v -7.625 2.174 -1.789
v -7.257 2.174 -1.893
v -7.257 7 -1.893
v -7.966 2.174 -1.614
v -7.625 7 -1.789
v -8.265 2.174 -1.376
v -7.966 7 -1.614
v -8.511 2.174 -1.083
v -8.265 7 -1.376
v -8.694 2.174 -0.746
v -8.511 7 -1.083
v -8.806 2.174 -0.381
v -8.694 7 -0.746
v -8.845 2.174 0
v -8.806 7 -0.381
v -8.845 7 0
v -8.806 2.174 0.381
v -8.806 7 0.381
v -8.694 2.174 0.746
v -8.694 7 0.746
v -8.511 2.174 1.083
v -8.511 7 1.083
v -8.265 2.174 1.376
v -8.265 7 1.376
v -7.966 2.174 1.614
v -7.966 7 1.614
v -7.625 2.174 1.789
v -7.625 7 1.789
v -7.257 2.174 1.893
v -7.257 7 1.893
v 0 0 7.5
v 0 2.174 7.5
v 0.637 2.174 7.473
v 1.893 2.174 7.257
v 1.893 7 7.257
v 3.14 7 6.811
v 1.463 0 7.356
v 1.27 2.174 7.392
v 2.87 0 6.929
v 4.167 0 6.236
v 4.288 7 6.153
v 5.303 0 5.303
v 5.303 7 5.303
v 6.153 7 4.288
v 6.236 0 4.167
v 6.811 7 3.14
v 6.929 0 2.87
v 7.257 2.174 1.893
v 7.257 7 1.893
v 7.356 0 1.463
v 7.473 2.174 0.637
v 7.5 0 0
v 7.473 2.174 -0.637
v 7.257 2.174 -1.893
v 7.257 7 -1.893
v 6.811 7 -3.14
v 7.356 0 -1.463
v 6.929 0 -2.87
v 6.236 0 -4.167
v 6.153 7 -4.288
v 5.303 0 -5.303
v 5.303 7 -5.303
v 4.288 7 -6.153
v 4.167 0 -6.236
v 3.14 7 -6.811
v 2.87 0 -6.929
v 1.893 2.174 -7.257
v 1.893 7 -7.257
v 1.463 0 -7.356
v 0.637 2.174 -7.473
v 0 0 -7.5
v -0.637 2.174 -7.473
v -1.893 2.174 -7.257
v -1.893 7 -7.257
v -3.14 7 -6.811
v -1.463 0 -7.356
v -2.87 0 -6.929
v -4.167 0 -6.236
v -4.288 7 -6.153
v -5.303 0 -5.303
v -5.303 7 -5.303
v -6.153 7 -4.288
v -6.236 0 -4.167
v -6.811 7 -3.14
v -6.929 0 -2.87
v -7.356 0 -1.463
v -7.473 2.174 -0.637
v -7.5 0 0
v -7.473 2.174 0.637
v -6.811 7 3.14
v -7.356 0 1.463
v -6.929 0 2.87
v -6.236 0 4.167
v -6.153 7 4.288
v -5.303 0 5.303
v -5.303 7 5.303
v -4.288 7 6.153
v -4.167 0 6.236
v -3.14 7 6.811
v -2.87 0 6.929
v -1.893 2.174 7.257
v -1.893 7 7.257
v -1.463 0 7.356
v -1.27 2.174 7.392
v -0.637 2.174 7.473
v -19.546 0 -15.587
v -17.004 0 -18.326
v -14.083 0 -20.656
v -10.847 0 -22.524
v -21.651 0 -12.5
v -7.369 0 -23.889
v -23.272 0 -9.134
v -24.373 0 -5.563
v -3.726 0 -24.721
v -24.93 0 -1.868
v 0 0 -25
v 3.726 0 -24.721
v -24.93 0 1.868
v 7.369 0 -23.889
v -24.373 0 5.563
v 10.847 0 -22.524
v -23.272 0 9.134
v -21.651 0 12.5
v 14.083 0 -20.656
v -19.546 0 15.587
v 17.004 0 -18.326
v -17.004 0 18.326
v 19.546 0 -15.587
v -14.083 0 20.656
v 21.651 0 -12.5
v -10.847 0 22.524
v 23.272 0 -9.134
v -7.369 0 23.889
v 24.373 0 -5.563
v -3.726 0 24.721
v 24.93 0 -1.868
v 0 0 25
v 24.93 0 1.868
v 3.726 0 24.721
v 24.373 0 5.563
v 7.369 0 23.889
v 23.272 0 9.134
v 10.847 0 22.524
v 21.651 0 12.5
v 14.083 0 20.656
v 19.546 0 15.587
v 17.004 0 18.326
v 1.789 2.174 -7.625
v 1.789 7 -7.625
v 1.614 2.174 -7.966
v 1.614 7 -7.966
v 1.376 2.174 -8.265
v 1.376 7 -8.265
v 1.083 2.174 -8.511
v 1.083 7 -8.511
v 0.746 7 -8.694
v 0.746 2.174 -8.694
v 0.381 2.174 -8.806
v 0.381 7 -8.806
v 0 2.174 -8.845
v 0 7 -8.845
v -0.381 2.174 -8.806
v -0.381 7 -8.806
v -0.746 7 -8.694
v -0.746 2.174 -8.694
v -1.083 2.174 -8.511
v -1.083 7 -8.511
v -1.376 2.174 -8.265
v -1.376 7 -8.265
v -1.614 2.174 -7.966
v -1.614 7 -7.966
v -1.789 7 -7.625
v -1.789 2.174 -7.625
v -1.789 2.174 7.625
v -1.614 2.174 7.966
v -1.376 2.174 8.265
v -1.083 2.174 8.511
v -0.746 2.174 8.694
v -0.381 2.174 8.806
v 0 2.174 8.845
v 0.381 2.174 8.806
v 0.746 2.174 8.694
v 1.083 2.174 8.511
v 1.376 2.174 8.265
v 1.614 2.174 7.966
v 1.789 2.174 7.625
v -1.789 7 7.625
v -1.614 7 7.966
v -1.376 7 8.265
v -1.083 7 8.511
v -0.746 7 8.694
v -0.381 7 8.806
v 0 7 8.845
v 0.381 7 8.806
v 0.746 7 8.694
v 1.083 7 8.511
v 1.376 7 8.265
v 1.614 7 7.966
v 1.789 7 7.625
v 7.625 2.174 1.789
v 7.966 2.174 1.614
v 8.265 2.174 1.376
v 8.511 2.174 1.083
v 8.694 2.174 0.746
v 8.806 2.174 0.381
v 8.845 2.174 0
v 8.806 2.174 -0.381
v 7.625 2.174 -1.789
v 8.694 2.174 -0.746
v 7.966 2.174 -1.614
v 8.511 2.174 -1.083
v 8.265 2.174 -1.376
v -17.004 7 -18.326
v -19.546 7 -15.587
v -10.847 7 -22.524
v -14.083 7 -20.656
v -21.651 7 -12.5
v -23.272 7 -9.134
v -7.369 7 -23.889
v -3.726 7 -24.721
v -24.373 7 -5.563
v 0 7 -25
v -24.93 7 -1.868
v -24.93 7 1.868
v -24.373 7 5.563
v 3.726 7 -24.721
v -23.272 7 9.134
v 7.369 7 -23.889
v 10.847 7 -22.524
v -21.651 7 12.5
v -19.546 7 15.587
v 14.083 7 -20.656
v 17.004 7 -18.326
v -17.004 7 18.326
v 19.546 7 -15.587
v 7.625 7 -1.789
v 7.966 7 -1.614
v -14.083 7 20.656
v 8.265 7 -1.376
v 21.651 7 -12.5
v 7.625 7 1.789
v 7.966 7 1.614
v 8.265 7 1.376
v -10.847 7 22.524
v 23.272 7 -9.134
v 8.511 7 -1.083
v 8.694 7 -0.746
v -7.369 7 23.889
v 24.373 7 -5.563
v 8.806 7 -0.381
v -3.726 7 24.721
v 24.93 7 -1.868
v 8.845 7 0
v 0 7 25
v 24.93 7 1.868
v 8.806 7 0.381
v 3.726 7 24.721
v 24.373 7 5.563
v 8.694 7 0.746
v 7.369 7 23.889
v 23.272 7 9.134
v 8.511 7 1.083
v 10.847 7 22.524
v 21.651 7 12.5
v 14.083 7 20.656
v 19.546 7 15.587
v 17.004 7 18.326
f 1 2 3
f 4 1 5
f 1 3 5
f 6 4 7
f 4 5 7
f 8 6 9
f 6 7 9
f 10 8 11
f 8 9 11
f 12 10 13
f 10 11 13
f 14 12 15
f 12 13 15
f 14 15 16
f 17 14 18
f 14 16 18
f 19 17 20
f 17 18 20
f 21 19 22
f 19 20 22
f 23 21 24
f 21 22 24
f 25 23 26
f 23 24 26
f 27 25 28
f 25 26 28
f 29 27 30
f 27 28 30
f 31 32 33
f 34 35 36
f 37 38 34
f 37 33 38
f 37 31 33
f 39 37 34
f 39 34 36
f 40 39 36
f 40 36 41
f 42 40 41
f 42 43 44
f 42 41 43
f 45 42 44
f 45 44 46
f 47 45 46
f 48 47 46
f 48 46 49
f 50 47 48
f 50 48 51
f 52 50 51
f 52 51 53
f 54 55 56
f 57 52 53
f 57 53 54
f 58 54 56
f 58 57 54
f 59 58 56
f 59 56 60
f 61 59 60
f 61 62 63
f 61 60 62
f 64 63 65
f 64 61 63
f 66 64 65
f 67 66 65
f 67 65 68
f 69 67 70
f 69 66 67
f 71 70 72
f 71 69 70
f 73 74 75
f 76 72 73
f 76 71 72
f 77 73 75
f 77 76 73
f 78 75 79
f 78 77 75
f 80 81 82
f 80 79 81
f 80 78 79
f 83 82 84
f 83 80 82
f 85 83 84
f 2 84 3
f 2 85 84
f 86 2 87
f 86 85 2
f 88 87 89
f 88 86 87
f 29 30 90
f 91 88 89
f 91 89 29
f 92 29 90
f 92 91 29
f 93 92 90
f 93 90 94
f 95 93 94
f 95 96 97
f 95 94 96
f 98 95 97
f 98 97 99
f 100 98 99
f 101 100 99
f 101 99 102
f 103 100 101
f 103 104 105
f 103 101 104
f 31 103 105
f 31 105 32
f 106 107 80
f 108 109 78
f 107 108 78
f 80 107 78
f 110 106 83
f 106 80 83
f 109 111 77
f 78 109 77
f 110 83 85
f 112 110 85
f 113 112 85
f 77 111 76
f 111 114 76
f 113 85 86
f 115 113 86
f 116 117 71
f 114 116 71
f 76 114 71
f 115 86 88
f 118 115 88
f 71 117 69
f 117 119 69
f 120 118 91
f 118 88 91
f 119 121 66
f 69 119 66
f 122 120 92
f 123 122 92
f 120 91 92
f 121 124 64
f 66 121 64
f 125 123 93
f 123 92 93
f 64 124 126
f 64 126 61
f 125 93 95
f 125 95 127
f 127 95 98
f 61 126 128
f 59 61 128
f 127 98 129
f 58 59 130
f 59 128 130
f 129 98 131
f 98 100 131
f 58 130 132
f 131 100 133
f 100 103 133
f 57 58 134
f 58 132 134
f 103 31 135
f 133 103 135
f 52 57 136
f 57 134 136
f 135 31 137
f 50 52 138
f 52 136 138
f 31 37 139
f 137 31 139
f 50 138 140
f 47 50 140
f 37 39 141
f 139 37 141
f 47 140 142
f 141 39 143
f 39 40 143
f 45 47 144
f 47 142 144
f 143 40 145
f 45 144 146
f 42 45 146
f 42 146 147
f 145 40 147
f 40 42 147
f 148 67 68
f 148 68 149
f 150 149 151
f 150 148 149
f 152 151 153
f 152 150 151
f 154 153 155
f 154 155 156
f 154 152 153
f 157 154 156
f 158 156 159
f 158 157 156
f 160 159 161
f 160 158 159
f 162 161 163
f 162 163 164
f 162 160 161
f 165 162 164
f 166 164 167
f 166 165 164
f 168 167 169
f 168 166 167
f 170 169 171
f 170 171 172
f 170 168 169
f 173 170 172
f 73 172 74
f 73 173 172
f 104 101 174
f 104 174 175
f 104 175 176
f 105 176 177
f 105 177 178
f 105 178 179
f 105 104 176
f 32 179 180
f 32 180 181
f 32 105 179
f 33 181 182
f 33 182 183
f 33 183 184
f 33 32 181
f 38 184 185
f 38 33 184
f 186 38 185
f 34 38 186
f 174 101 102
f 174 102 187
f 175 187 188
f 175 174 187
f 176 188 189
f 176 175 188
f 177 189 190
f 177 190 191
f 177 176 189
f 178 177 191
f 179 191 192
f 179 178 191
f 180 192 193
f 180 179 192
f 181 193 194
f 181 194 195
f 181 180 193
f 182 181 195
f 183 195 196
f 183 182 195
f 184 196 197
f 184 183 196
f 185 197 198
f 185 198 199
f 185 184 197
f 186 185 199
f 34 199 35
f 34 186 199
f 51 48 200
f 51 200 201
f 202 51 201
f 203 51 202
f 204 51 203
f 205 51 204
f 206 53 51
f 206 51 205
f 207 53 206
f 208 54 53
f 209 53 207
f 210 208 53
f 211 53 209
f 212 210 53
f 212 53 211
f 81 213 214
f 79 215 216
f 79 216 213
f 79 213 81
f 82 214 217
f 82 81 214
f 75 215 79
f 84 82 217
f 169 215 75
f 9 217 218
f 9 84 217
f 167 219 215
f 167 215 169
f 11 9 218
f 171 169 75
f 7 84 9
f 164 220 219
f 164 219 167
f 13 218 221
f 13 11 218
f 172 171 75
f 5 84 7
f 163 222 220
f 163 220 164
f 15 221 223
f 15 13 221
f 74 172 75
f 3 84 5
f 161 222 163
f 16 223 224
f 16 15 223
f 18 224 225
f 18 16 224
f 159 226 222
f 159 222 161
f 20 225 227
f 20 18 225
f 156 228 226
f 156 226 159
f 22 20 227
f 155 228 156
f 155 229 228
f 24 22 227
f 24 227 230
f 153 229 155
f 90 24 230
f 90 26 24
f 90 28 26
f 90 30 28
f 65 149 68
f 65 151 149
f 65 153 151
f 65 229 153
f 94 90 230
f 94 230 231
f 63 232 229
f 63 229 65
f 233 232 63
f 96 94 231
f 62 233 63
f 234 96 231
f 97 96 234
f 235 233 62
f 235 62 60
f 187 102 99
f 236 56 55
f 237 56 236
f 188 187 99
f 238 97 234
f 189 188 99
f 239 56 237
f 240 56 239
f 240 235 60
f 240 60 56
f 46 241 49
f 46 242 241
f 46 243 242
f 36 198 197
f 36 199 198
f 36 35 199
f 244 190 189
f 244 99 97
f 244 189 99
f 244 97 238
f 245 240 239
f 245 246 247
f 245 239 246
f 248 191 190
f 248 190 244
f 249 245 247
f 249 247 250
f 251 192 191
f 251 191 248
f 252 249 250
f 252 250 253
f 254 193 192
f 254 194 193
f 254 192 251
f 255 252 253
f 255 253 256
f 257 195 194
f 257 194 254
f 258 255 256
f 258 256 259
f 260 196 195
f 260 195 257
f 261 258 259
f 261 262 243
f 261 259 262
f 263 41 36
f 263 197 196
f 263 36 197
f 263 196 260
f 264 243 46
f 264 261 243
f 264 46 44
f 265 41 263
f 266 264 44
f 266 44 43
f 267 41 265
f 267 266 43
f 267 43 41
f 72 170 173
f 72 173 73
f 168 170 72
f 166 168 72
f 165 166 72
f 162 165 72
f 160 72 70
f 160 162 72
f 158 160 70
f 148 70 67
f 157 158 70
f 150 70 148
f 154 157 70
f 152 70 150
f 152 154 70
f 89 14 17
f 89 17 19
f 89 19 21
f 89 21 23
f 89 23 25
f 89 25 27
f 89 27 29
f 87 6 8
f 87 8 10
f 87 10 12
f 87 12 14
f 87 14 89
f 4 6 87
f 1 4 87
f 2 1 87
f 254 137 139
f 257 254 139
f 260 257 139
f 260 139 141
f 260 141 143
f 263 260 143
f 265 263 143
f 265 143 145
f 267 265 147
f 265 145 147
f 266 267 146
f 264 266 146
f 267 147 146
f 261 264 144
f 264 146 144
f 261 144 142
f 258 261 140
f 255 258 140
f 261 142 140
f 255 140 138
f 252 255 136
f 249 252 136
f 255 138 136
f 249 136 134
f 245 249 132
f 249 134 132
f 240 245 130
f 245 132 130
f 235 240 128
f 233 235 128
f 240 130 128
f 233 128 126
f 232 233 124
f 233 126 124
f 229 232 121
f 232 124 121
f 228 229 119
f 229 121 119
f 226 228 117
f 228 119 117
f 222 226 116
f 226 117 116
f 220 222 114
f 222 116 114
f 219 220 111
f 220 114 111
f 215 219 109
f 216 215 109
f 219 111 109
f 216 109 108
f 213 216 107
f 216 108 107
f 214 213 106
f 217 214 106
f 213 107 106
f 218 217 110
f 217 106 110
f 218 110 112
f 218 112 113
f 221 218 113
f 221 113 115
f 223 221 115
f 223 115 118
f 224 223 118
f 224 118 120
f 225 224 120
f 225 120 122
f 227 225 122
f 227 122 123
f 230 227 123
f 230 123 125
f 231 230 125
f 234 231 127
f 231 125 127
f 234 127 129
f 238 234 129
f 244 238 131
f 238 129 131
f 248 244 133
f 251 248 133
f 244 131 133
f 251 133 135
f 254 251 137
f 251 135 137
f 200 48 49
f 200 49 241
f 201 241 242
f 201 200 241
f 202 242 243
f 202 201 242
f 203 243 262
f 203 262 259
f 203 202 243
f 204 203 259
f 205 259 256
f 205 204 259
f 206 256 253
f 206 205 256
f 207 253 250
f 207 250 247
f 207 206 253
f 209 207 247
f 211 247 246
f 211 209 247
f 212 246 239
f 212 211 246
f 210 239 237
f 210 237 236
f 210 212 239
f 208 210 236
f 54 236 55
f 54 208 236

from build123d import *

# Parameters (mm, degrees)
SKETCH1_R           = 25
BOSS_EXTRUDE1_DEPTH = 7
SKETCH2_R           = 7.5
CUT_EXTRUDE1_DEPTH  = 37.041642582
SKETCH3_R           = 1.922442869
CUT_EXTRUDE2_DEPTH  = 4.826156053
CIRPATTERN1_COUNT   = 4


with BuildPart() as part:
    # Sketch1 → Boss-Extrude1 (new body)
    with BuildSketch(Plane(origin=(0, 0, 0), x_dir=(1, 0, 0), z_dir=(0, 1, 0))):
        Circle(SKETCH1_R)
    extrude(amount=BOSS_EXTRUDE1_DEPTH)

    # Sketch2 → Cut-Extrude1 (cut, through all)
    with BuildSketch(Plane(origin=(0, 0, 0), x_dir=(1, 0, 0), z_dir=(0, 1, 0))):
        Circle(SKETCH2_R)
    extrude(amount=CUT_EXTRUDE1_DEPTH, mode=Mode.SUBTRACT)

    # Sketch3 → Cut-Extrude2 (cut)
    with BuildSketch(Plane(origin=(0, 7, 0), x_dir=(1, 0, 0), z_dir=(0, 1, 0))):
        with Locations((-6.922121964, 0)):
            Circle(SKETCH3_R)
    cut_extrude2 = extrude(amount=-CUT_EXTRUDE2_DEPTH, mode=Mode.SUBTRACT)

    # CirPattern1: Cut-Extrude2 ×4 about axis
    cirpattern1_axis = Axis((0, 0, 0), (0, 1, 0))
    for i in range(1, CIRPATTERN1_COUNT):
        add(cut_extrude2.rotate(cirpattern1_axis, i * 360 / CIRPATTERN1_COUNT), mode=Mode.SUBTRACT)


solid = part.part
